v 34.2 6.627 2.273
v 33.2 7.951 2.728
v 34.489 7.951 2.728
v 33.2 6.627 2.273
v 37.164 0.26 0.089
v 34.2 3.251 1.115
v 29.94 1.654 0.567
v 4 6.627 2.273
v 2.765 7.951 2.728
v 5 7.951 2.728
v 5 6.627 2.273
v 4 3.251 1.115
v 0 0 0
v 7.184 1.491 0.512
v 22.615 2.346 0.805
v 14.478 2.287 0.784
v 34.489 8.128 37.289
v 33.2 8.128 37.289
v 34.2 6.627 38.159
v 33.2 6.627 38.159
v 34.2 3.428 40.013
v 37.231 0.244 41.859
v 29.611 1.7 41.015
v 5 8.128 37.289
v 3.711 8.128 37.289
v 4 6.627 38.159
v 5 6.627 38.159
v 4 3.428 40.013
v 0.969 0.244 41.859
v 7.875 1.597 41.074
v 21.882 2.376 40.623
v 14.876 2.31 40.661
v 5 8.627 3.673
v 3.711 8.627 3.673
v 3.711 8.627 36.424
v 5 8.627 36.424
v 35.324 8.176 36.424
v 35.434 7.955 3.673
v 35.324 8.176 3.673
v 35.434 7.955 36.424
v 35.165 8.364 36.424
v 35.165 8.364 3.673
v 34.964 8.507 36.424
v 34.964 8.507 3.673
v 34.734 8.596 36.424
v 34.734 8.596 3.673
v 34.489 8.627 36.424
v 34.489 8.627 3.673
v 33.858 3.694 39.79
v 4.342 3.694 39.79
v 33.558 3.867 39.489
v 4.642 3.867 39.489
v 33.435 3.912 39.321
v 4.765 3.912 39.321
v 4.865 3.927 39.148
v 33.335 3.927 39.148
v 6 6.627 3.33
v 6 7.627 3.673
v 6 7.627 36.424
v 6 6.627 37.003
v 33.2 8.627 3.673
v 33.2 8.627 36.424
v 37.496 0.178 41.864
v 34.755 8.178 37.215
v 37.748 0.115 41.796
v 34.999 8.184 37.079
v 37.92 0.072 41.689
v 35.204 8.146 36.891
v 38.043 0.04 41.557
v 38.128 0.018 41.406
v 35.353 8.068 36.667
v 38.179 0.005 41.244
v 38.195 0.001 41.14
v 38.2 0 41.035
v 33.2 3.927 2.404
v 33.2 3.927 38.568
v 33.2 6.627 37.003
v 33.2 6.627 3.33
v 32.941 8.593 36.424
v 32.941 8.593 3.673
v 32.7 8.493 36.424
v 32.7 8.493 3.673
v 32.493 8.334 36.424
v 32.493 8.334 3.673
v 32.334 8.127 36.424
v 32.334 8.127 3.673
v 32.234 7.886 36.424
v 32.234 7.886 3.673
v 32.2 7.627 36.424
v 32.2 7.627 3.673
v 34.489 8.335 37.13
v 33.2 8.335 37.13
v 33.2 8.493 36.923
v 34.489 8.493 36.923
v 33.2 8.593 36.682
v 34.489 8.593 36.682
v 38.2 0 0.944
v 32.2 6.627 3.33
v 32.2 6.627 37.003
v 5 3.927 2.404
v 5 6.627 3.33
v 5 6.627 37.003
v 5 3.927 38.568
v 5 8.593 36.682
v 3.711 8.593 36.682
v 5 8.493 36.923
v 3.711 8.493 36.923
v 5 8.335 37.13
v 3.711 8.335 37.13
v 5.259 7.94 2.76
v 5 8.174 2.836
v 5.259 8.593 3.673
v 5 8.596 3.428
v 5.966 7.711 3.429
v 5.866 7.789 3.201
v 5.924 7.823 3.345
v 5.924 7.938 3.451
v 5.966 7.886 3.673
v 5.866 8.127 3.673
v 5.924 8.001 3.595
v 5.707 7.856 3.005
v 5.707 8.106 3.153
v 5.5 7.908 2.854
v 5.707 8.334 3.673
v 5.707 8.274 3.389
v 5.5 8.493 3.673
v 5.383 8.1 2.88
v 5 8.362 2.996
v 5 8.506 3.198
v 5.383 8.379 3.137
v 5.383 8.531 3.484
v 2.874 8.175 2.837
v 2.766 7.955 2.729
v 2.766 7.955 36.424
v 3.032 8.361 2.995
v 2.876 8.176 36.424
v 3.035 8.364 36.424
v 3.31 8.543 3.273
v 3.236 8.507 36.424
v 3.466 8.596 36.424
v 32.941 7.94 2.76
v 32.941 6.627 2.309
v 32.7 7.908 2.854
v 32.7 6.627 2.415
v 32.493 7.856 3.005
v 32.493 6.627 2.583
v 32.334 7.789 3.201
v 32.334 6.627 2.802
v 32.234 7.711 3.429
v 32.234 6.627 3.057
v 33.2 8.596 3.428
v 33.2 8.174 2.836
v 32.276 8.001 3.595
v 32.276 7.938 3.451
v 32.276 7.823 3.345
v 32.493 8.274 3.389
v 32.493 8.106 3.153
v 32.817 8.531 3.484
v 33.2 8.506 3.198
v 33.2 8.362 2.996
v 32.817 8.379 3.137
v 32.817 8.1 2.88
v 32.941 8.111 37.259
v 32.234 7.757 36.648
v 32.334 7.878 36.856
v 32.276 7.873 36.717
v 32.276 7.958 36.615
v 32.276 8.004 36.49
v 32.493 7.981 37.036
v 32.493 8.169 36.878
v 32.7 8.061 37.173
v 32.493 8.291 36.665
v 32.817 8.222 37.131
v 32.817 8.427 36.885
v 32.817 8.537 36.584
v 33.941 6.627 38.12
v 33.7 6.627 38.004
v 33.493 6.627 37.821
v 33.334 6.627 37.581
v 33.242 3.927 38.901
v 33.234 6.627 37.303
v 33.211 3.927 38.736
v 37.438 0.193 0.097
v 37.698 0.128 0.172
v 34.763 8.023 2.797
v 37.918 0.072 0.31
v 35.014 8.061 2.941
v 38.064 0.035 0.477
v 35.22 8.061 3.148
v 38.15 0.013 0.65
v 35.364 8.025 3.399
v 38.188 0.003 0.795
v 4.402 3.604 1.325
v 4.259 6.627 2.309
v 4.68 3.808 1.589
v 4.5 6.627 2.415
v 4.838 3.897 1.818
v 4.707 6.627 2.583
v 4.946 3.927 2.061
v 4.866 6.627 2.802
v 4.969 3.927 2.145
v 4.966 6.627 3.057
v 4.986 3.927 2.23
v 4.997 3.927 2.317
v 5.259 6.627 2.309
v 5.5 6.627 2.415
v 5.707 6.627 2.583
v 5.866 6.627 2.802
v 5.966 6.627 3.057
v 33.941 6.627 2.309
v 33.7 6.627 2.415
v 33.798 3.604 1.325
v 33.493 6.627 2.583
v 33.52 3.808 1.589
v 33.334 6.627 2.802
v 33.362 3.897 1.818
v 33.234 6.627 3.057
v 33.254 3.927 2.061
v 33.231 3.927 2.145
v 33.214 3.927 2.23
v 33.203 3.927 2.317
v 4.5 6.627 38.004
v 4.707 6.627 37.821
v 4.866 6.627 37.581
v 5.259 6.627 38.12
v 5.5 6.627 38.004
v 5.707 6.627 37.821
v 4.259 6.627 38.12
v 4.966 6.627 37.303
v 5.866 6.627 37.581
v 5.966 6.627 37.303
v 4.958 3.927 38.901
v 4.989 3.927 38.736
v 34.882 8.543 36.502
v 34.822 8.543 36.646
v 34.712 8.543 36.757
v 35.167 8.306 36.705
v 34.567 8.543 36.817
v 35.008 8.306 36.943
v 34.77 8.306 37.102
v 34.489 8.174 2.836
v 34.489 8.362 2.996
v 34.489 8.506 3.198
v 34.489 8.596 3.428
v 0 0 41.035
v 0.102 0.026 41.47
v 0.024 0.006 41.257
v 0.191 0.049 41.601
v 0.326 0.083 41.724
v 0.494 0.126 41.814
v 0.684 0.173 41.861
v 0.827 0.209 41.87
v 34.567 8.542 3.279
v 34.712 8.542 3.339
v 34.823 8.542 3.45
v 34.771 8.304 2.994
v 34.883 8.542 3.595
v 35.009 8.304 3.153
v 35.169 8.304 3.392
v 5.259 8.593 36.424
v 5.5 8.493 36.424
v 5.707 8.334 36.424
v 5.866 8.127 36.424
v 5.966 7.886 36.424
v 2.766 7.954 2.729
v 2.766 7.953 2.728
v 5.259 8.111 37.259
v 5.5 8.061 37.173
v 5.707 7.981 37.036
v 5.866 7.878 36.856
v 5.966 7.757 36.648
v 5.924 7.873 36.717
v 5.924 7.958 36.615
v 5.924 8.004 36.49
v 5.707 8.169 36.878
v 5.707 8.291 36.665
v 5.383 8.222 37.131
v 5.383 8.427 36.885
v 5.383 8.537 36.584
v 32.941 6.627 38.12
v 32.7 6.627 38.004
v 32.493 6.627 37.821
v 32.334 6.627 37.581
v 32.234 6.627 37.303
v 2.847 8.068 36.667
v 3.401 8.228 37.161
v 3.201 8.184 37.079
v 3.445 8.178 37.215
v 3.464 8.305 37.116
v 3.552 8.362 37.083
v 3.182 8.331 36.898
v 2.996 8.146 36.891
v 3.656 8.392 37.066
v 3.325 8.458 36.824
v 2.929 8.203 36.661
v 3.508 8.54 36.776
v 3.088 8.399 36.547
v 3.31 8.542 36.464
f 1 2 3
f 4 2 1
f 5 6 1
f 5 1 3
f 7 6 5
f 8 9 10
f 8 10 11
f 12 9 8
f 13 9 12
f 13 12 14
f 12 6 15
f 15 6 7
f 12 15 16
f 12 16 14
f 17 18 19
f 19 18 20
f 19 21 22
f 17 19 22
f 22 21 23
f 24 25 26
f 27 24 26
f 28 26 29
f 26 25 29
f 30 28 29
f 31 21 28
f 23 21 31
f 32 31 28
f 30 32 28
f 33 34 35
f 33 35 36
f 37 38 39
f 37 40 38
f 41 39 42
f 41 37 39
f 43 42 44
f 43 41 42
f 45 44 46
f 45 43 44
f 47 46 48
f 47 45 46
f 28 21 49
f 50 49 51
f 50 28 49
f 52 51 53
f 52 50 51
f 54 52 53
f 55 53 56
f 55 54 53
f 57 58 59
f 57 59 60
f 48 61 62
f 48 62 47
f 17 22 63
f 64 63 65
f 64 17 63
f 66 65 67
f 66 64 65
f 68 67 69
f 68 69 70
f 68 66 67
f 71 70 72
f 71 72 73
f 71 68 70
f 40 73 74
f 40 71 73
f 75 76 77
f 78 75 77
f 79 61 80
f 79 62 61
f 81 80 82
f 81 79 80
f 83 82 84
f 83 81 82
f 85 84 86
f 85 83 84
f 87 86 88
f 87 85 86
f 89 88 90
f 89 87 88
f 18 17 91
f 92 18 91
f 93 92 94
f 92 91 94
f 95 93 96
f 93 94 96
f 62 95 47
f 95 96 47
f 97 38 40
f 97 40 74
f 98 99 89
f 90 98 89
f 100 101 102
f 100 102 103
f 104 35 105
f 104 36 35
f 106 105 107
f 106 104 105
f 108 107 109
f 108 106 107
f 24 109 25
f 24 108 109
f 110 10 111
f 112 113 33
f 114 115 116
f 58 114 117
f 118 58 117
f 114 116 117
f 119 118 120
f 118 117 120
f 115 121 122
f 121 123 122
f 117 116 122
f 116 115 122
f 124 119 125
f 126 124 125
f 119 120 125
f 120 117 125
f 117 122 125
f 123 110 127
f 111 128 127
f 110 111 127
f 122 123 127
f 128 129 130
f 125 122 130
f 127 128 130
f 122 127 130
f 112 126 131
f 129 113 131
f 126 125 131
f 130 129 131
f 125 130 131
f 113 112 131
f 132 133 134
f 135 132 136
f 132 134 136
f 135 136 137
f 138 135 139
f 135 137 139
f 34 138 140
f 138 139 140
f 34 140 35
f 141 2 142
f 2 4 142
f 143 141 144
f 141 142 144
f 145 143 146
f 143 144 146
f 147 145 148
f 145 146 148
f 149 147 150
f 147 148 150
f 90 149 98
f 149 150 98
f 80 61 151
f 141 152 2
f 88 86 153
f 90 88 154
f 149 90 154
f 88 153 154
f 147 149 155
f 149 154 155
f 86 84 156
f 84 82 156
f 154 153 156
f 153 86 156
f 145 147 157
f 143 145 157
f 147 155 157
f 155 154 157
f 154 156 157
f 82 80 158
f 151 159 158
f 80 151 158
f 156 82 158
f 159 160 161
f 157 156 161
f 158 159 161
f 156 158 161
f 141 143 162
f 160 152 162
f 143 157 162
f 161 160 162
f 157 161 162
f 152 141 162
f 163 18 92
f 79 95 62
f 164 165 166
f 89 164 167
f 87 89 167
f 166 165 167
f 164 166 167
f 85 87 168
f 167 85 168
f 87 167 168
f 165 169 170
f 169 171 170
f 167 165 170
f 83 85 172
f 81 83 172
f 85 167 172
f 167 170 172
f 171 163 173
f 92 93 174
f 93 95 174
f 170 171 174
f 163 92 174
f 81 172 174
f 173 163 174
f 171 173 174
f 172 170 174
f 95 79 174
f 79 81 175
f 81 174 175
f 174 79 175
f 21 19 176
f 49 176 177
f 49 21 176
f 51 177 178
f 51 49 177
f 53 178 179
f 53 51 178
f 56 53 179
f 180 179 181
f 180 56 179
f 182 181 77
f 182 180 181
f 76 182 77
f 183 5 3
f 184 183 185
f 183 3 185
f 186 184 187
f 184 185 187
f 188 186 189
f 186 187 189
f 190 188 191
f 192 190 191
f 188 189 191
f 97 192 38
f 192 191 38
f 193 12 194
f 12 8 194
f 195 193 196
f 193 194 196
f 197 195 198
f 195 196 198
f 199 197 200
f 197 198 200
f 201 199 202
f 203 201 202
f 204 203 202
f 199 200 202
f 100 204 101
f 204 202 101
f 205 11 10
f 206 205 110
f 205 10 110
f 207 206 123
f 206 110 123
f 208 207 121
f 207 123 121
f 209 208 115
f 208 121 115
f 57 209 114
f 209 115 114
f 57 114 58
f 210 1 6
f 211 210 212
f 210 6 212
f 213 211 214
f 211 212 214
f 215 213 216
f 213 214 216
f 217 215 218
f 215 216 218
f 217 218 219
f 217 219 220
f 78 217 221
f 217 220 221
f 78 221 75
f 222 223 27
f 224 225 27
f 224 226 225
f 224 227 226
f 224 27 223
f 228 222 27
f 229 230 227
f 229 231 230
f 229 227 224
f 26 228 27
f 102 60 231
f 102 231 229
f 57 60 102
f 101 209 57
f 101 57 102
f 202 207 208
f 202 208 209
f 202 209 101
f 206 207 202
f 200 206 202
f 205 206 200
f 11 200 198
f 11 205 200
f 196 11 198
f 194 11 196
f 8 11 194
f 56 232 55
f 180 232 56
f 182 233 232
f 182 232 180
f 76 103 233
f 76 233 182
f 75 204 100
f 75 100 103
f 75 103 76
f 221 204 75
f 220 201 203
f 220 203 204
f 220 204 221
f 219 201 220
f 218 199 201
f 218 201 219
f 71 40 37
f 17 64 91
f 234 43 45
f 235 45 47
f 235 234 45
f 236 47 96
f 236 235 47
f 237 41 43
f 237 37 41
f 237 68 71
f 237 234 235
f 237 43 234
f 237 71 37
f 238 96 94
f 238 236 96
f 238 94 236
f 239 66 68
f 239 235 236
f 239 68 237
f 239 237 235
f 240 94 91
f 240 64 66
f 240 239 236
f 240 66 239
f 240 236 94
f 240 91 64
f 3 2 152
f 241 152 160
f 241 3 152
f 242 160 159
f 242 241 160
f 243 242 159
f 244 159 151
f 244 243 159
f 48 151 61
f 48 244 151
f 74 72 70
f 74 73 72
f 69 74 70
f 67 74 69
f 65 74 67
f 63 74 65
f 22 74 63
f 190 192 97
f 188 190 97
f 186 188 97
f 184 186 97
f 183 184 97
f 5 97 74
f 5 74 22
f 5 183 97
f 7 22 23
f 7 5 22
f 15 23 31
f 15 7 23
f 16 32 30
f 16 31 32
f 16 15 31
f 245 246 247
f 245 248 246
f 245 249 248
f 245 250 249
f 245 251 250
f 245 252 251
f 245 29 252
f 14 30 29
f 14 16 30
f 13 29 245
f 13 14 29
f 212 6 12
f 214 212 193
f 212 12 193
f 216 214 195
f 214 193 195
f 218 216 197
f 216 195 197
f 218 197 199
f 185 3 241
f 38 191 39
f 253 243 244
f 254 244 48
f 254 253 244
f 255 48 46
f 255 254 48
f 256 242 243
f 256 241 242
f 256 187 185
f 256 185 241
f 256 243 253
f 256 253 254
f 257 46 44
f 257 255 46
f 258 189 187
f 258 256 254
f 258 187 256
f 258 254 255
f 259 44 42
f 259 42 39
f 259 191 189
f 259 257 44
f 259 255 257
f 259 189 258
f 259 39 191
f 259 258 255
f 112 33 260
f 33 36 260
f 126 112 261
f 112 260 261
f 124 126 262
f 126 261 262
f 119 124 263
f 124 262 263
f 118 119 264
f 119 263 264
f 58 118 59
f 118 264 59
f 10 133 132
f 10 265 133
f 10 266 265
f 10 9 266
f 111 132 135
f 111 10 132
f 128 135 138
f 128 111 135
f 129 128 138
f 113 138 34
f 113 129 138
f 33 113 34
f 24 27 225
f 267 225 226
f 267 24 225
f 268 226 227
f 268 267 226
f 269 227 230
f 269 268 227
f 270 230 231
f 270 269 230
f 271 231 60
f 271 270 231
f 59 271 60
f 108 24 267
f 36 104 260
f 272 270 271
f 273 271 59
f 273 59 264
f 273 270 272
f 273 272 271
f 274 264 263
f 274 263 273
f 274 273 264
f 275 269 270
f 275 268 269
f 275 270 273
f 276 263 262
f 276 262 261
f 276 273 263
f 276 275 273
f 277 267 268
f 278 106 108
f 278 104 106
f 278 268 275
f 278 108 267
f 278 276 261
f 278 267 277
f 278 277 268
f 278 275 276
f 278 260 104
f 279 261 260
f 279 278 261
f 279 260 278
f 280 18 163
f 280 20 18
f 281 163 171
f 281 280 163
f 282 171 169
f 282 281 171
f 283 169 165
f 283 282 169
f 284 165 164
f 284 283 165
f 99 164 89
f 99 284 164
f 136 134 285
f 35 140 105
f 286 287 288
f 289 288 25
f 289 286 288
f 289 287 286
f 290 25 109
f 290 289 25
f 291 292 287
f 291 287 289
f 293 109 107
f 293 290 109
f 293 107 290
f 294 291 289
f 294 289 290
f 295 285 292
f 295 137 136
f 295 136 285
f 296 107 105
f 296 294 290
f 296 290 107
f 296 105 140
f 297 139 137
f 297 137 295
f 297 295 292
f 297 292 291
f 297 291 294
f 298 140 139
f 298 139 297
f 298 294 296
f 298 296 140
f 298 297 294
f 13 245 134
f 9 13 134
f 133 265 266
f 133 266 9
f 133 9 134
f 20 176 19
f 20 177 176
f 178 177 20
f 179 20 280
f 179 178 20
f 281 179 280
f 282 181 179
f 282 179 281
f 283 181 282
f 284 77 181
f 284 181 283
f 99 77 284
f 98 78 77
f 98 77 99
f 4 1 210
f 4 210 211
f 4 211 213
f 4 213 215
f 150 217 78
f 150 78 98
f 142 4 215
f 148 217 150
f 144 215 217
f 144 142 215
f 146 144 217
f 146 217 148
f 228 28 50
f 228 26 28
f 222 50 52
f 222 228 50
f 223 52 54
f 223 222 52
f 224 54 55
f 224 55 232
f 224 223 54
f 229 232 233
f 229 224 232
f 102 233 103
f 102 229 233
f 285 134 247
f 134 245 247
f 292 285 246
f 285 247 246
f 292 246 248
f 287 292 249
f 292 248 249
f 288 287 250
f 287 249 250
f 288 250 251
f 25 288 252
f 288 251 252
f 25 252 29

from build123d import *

# Parameters (mm, degrees)
BOSS_EXTRUDE1_DEPTH = 42
CUT_EXTRUDE2_DEPTH  = 58.425262324
FILLET1_R           = 1


with BuildPart() as part:
    # Sketch1 → Boss-Extrude1 (new body)
    with BuildSketch(Plane.XY):
        with BuildLine():
            Line((0, 0), (3, 8.626746371))
            Line((3, 8.626746371), (6, 8.626746371))
            Line((6, 8.626746371), (6, 6.626746371))
            Line((6, 6.626746371), (5, 6.626746371))
            Line((5, 6.626746371), (5, 3.926746371))
            Line((5, 3.926746371), (33.2, 3.926746371))
            Line((33.2, 3.926746371), (33.2, 6.626746371))
            Line((33.2, 6.626746371), (32.2, 6.626746371))
            Line((32.2, 6.626746371), (32.2, 8.626746371))
            Line((32.2, 8.626746371), (35.2, 8.626746371))
            Line((35.2, 8.626746371), (38.2, 0))
            ThreePointArc((38.2, 0), (19.1, 2.426746371), (0, 0))
        make_face()
    extrude(amount=BOSS_EXTRUDE1_DEPTH)

    # Sketch5 → Cut-Extrude2 (cut, through all)
    with BuildSketch(Plane(origin=(0, 0, 0), x_dir=(0, 0, -1), z_dir=(1, 0, 0))):
        Polygon((-42, 0), (-42, 8.626746371), (-37, 8.626746371), align=None)
        Polygon((0, 0), (0, 8.626746371), (-2.959406662, 8.626746371), align=None)
    extrude(amount=CUT_EXTRUDE2_DEPTH, mode=Mode.SUBTRACT)

    # Fillet1
    fillet1_edges = [part.edges().sort_by_distance(p)[0] for p in [
        (32.2, 7.626746371, 2.616356509),
        (33.2, 5.276746371, 1.81018865),
        (36.7, 4.313373185, 1.479703331),
        (33.7, 8.626746371, 2.959406662),
        (3, 8.626746371, 19.979703331),
        (4.5, 8.626746371, 2.959406662),
        (19.1, 3.926746371, 1.347070943),
        (5, 5.276746371, 1.81018865),
        (6, 7.626746371, 2.616356509),
        (36.7, 4.313373185, 39.5),
        (1.5, 4.313373185, 39.5),
        (35.2, 8.626746371, 19.979703331),
        (6, 8.626746371, 19.979703331),
        (4.5, 8.626746371, 37),
        (6, 7.626746371, 37.57959279),
        (5, 5.276746371, 38.941635847),
        (32.2, 8.626746371, 19.979703331),
        (33.7, 8.626746371, 37),
        (32.2, 7.626746371, 37.57959279),
        (33.2, 5.276746371, 38.941635847),
        (19.1, 3.926746371, 39.724086114),
    ]]
    fillet(fillet1_edges, radius=FILLET1_R - 0.0001)  # a hair under: the kernel refuses the full size


solid = part.part
